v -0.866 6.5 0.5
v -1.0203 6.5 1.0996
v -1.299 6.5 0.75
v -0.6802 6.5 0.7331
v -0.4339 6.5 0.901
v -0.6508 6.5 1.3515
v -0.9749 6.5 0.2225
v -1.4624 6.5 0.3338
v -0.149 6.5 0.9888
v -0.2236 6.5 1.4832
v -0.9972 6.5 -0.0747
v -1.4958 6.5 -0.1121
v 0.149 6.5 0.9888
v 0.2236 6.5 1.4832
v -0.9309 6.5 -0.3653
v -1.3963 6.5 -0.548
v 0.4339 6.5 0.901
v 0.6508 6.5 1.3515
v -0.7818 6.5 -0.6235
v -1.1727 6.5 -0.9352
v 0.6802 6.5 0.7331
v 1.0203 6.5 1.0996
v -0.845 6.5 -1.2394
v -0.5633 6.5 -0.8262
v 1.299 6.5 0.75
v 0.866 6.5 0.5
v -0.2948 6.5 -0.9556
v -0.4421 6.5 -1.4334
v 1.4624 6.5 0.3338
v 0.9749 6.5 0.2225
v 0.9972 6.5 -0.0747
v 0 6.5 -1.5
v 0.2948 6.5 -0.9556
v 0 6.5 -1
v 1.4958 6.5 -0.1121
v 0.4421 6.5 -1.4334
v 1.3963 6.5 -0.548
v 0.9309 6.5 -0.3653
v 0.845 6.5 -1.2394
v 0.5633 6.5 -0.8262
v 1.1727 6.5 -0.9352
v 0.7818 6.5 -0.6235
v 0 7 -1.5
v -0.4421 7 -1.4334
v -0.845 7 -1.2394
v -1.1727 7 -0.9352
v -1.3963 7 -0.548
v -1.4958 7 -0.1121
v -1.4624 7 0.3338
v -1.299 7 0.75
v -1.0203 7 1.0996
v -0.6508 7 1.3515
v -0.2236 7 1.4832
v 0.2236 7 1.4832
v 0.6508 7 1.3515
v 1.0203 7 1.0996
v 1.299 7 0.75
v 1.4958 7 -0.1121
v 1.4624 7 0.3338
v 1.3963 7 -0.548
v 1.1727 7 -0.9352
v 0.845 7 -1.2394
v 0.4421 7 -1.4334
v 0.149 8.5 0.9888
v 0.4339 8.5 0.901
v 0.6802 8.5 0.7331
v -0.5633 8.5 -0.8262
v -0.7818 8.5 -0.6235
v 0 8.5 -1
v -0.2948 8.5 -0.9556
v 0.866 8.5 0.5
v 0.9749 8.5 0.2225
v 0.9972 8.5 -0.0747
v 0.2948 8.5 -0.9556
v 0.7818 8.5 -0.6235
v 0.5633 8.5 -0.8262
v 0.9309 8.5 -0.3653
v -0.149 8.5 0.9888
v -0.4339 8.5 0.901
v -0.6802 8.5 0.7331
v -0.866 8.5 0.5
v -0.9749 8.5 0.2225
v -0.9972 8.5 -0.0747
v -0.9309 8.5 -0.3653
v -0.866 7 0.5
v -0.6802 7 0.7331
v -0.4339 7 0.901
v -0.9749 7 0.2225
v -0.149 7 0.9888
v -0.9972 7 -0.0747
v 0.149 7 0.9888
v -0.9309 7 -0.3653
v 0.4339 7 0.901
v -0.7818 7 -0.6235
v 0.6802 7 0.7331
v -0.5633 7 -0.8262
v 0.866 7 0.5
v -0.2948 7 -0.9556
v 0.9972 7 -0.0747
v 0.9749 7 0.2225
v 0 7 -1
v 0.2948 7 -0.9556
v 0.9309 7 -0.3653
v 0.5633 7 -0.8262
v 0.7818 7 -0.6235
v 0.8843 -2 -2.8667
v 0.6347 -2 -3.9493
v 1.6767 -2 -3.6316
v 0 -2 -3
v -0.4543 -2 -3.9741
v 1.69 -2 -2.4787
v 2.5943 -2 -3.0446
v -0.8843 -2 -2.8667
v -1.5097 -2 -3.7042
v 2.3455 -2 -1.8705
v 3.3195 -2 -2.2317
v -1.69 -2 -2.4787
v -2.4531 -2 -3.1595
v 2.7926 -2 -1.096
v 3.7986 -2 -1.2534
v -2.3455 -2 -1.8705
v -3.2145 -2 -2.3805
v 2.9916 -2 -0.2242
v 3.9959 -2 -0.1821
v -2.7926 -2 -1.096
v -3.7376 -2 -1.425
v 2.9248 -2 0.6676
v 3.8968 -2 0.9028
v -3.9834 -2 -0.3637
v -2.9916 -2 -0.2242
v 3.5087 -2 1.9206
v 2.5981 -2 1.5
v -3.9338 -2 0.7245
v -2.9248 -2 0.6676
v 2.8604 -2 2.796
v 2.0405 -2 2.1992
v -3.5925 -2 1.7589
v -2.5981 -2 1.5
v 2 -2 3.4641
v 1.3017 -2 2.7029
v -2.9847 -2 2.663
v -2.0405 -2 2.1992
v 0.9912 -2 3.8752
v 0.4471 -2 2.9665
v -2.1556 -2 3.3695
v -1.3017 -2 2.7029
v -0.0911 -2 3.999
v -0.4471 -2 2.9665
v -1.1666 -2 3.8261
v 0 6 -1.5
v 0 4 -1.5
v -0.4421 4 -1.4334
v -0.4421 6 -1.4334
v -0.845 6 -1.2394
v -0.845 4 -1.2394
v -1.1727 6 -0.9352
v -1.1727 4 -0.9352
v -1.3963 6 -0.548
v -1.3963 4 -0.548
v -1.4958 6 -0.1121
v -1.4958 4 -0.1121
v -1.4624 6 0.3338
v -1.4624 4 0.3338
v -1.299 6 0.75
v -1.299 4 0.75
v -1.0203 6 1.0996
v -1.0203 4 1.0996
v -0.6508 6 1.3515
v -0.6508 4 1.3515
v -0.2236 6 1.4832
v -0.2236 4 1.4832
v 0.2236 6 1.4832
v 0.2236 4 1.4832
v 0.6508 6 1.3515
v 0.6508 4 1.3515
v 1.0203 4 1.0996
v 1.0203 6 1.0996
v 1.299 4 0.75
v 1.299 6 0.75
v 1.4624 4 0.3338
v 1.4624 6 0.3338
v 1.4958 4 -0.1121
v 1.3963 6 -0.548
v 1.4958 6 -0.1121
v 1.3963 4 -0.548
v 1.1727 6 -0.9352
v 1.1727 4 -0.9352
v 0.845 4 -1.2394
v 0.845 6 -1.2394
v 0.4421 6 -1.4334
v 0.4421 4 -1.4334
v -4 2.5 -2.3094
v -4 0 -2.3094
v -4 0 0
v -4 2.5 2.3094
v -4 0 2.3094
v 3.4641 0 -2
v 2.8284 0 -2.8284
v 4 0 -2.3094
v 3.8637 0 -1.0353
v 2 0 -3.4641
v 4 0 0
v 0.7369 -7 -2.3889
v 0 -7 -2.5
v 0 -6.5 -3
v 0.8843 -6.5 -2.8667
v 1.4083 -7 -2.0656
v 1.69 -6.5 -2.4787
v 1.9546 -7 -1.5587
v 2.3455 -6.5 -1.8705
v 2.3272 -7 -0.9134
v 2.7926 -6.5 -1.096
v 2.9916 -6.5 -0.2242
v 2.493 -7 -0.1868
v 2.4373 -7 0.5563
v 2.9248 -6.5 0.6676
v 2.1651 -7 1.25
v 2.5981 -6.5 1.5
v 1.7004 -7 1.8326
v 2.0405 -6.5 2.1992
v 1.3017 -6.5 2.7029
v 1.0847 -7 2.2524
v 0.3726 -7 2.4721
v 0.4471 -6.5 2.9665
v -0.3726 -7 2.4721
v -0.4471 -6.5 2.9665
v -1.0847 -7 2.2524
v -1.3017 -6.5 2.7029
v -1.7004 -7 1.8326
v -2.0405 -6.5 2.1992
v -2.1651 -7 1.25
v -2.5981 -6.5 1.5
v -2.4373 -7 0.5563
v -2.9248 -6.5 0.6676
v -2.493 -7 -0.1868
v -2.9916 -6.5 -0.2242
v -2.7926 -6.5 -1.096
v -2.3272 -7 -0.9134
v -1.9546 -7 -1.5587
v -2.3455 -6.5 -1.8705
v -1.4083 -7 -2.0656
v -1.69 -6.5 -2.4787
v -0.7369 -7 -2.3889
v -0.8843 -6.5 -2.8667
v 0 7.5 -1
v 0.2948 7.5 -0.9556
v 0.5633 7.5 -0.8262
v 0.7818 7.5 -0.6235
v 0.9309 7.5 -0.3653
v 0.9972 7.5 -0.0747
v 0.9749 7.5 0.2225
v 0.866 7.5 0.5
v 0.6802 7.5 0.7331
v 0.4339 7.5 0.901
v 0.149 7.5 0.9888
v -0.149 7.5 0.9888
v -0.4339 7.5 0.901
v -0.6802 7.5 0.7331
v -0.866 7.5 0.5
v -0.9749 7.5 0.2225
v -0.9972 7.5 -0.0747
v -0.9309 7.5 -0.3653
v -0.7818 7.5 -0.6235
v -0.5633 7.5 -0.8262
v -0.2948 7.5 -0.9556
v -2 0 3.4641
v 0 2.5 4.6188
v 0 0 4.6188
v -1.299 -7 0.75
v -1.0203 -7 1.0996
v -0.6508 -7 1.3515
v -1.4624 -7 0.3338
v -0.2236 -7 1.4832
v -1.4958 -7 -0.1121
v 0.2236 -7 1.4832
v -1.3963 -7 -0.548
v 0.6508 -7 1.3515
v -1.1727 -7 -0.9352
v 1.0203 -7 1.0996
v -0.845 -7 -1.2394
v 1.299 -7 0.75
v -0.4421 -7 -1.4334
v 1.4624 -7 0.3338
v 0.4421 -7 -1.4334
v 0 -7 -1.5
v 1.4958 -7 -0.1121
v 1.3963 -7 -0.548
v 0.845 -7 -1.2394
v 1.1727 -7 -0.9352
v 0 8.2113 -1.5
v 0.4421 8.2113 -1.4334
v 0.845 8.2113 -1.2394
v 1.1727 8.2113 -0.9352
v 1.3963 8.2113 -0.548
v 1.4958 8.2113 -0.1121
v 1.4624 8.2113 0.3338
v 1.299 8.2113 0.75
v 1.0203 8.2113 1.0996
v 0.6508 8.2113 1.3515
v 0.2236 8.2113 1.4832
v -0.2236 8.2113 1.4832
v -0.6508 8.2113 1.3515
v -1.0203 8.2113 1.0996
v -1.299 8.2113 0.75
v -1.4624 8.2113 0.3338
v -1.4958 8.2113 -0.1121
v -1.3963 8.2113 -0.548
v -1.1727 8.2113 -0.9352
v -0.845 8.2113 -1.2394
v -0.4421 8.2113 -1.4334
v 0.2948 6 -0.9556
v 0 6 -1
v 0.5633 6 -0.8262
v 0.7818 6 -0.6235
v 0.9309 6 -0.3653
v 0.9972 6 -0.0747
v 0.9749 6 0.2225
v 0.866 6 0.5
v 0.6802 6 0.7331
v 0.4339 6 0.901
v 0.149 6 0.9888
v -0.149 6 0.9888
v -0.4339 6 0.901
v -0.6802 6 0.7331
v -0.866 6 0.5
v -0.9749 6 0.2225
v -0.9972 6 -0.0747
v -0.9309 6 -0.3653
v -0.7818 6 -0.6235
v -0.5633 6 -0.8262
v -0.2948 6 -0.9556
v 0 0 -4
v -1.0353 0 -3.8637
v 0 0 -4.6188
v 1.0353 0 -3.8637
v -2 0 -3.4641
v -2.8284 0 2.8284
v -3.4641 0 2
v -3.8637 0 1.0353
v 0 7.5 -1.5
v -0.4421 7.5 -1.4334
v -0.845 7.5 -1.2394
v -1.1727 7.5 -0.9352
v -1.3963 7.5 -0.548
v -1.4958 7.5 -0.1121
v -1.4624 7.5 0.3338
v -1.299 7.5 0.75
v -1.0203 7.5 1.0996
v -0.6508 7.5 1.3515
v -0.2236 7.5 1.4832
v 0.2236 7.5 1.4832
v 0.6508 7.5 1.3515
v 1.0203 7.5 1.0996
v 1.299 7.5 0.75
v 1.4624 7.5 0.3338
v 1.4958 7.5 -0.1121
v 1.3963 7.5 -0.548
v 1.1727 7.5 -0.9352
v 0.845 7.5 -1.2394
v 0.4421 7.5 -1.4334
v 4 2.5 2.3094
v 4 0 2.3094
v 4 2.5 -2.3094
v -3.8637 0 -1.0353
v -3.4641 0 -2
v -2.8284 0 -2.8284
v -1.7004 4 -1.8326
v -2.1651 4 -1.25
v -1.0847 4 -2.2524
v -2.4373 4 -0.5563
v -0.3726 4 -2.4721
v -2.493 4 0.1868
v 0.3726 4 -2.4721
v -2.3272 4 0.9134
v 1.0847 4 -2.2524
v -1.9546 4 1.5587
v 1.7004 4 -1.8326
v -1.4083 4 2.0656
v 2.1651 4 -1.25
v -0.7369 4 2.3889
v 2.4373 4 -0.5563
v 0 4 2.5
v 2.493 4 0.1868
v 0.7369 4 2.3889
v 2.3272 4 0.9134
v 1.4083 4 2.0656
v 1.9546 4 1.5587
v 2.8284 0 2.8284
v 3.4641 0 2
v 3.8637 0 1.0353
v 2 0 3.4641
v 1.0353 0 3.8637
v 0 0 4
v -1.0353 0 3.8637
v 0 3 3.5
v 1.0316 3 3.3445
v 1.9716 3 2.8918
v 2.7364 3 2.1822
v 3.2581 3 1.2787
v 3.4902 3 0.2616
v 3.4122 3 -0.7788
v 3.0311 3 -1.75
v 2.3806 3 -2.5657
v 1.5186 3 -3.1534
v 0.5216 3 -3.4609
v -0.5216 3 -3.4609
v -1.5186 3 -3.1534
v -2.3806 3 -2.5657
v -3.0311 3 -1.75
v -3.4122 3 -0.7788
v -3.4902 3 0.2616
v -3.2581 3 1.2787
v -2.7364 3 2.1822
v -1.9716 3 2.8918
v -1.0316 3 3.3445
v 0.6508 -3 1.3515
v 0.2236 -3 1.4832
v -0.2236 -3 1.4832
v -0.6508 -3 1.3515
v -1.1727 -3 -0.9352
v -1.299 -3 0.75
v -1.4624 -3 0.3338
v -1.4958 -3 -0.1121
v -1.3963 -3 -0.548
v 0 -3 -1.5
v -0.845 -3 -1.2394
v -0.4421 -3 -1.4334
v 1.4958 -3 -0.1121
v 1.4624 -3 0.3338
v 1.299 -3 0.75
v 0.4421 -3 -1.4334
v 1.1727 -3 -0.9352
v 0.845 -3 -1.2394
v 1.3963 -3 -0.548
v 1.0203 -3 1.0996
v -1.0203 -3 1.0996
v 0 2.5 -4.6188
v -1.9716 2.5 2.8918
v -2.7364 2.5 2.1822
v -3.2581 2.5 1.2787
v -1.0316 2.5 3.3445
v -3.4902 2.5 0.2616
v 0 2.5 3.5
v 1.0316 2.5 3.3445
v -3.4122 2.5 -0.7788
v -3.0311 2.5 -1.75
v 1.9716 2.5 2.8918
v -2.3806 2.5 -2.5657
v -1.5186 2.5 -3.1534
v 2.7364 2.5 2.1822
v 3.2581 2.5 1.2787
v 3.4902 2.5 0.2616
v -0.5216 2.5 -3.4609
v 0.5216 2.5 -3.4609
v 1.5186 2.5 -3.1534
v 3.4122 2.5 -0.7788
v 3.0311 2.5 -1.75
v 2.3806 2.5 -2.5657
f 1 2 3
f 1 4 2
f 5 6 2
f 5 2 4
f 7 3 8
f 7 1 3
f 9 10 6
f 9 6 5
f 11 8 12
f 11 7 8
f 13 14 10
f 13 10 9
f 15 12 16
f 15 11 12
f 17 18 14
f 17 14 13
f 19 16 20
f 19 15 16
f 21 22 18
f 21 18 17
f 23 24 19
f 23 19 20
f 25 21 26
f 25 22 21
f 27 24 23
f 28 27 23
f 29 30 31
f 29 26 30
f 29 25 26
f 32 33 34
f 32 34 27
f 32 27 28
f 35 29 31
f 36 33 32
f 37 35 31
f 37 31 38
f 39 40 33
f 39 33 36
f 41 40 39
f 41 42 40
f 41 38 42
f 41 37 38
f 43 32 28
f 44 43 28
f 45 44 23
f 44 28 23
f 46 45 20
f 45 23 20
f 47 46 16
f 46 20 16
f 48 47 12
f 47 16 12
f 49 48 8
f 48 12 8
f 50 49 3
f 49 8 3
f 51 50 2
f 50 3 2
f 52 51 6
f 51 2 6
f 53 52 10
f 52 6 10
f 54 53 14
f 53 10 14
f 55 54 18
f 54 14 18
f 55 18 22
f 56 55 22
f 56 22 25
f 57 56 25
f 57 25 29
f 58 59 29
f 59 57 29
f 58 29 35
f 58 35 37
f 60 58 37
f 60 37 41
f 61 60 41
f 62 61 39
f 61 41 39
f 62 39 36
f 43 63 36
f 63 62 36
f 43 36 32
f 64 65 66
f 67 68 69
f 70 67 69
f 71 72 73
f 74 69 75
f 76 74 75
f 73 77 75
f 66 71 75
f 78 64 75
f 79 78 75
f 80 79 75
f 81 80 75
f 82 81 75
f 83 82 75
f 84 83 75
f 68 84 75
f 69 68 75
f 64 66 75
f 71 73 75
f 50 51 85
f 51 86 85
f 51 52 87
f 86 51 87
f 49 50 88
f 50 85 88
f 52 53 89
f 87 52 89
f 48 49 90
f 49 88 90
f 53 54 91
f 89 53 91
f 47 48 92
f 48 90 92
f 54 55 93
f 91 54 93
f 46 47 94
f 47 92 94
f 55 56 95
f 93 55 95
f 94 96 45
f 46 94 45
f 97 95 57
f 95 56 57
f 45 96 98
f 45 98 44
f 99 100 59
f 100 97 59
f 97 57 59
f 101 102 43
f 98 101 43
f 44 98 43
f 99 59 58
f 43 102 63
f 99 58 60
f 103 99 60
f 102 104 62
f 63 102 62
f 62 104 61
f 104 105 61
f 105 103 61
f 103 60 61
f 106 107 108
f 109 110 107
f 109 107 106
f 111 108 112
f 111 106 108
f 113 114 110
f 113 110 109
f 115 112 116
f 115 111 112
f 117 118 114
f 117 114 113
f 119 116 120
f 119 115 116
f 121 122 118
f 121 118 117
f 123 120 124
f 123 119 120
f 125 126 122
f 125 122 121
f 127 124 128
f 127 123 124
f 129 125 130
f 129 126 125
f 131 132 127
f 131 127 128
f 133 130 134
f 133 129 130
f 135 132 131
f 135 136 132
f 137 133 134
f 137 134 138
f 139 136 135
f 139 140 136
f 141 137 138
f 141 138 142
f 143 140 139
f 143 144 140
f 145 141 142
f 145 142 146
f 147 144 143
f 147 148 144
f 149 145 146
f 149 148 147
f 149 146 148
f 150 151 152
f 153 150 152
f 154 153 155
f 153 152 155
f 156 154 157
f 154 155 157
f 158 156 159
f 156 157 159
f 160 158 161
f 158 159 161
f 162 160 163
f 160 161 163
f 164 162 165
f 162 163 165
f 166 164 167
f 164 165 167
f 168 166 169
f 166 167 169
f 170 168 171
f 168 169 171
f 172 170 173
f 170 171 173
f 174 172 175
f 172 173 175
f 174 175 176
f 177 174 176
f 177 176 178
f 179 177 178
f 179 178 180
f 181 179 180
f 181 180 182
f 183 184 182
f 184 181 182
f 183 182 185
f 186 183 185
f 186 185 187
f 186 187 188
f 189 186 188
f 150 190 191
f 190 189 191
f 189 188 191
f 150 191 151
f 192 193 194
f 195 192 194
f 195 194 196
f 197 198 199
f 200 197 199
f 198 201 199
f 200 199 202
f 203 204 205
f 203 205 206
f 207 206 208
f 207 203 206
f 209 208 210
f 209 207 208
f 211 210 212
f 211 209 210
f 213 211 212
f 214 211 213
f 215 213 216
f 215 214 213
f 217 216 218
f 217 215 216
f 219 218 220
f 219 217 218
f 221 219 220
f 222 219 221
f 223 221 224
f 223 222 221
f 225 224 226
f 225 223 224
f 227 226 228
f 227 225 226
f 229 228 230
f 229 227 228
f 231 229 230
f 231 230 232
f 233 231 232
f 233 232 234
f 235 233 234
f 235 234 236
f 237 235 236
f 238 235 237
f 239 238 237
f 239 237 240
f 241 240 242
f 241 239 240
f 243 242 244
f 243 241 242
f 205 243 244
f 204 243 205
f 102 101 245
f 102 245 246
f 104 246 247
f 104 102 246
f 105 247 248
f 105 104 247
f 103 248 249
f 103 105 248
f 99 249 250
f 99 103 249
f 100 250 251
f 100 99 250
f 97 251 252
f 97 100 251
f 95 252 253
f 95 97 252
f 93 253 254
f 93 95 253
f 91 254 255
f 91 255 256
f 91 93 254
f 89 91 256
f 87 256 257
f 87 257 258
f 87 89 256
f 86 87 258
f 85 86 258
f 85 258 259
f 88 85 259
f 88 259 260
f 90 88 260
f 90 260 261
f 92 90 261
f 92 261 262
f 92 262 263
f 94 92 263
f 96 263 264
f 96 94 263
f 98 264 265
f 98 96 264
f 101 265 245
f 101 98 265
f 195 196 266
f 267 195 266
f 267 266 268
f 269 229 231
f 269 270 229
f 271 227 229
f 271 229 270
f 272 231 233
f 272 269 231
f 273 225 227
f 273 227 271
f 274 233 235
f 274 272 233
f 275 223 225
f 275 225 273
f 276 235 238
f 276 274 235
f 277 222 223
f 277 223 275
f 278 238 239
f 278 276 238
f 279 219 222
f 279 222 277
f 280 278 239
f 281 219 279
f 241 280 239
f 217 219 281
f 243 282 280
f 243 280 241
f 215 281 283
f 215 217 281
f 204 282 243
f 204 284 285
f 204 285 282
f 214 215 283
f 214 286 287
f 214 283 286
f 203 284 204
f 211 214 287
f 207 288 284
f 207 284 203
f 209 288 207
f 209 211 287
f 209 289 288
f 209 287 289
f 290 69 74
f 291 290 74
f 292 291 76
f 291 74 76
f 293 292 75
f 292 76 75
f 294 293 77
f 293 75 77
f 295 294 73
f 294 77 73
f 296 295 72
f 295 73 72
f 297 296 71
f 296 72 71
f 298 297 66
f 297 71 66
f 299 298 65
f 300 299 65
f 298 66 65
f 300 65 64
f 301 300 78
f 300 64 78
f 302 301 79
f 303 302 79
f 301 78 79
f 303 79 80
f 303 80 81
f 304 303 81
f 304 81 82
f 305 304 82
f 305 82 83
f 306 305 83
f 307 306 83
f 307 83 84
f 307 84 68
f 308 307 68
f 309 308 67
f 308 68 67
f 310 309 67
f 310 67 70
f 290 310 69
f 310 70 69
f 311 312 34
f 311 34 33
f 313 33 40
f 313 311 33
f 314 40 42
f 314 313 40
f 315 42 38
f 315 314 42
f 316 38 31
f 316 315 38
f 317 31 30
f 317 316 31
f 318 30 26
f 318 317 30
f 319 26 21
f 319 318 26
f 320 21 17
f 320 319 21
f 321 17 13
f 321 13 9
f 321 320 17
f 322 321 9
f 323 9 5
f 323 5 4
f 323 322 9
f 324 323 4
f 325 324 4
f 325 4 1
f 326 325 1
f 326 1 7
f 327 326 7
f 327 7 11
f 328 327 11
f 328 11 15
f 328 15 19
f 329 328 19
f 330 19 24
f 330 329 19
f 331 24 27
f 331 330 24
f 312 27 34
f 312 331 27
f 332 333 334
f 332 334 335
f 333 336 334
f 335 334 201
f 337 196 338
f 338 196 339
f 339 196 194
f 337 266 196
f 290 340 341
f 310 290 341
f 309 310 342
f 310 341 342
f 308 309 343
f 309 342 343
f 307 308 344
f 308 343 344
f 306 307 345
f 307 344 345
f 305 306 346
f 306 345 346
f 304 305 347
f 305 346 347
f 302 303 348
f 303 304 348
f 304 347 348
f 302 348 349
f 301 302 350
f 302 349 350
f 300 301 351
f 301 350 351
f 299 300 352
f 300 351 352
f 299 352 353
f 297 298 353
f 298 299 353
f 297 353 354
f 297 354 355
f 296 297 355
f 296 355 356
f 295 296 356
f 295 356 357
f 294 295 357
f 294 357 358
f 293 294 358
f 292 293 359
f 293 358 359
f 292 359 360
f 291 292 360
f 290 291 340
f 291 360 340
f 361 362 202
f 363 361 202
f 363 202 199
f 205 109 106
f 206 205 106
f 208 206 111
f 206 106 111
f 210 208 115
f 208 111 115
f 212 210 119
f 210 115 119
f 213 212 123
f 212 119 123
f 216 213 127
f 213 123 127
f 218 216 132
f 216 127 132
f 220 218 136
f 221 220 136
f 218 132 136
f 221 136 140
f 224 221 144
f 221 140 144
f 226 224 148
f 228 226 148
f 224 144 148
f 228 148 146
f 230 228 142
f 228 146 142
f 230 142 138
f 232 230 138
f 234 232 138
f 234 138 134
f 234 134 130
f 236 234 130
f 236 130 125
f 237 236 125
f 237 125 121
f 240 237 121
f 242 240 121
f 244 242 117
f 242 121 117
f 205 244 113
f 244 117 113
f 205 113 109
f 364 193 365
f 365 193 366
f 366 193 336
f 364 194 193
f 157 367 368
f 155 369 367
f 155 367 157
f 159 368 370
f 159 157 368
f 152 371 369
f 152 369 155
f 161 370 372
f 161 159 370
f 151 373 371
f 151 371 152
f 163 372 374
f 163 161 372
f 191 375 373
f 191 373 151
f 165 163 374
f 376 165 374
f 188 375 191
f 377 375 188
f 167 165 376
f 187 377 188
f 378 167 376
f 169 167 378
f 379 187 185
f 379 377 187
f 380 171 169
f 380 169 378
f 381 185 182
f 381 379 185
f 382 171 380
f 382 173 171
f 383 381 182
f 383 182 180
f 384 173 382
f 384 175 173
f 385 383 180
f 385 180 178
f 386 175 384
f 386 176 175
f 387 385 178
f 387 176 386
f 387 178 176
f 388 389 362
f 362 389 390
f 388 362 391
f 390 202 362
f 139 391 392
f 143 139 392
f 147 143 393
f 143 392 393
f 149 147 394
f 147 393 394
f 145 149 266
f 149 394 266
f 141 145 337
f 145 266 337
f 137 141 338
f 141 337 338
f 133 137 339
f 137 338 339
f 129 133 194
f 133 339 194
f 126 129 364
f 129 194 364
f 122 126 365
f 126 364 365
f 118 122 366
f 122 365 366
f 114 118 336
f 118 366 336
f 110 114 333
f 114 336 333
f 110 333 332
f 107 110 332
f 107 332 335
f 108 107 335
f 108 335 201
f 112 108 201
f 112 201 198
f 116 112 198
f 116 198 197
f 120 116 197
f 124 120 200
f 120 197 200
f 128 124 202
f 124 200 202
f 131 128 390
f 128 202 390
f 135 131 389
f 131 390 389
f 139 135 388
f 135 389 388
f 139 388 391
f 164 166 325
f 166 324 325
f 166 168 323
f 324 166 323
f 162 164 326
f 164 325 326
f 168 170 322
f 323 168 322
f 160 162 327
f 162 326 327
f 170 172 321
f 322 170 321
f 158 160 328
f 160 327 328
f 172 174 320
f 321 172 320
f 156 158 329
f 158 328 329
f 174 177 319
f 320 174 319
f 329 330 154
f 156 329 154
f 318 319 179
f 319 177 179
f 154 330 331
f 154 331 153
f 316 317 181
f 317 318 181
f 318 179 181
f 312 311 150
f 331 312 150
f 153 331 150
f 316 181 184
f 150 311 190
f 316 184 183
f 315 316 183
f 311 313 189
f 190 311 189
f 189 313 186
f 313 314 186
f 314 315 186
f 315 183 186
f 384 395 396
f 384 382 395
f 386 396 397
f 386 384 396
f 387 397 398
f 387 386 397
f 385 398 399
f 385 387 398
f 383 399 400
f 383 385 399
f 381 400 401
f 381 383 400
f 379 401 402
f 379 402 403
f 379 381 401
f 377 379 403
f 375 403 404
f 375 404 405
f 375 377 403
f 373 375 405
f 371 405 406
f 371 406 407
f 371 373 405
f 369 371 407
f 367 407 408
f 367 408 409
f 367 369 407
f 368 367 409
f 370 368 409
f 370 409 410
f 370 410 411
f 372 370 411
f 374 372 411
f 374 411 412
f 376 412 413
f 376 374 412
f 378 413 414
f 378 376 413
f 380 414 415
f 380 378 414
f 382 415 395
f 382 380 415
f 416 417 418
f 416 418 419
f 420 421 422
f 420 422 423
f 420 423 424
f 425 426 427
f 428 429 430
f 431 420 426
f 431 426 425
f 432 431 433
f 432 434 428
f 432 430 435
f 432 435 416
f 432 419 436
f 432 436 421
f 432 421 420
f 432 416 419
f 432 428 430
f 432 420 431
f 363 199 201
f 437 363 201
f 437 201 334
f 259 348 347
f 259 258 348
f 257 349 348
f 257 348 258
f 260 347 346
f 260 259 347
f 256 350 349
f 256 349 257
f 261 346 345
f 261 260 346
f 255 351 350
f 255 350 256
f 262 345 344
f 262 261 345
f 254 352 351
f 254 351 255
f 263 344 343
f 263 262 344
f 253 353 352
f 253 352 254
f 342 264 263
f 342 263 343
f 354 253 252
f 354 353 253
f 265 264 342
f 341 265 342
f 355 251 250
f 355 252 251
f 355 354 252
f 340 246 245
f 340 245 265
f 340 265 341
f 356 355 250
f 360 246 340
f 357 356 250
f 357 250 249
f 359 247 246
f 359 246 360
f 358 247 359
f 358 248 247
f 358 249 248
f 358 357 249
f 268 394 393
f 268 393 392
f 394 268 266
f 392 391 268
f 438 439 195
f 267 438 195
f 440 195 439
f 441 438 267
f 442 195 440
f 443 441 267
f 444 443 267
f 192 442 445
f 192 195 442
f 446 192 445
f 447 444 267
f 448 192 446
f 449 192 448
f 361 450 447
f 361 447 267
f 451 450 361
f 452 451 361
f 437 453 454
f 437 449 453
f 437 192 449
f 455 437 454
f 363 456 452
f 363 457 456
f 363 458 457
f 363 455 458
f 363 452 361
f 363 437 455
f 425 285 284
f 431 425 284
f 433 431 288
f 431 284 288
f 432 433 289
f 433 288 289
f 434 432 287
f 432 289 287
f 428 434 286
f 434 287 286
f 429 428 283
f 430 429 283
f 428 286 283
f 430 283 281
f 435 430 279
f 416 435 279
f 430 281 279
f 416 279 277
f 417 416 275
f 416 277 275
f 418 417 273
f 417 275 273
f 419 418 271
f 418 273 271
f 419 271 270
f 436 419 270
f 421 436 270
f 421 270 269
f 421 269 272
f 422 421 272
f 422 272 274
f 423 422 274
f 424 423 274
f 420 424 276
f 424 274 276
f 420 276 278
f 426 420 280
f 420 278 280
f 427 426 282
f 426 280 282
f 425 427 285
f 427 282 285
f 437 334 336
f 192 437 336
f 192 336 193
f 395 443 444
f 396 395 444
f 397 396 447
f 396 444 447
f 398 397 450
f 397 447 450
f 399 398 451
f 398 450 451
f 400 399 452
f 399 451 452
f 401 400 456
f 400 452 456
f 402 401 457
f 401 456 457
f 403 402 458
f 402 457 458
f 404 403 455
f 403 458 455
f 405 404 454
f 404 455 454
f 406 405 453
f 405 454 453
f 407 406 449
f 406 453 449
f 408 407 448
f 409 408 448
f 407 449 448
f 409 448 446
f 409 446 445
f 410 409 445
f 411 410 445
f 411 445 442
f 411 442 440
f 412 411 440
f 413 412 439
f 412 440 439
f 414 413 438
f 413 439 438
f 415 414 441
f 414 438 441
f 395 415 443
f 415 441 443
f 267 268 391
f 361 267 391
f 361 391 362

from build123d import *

# Parameters (mm, degrees)
BOSS_EXTRUDE5_DEPTH  = 2.5
SKETCH6_R            = 4
BOSS_EXTRUDE6_DEPTH  = 2
SKETCH7_R            = 3
BOSS_EXTRUDE7_DEPTH  = 5
SKETCH8_R            = 1.5
CUT_EXTRUDE1_DEPTH   = 4
SKETCH9_R            = 1.5
BOSS_EXTRUDE8_DEPTH  = 3.5
SKETCH10_R           = 3.5
BOSS_EXTRUDE9_DEPTH  = 0.5
SKETCH11_R           = 3.5
BOSS_EXTRUDE10_DEPTH = 1
BOSS_EXTRUDE10_TAPER = 45
BOSS_EXTRUDE11_START = -4
SKETCH12_R           = 1.5
BOSS_EXTRUDE11_DEPTH = 11.5
CUT_EXTRUDE2_START   = -13
SKETCH13_R           = 1.5
SKETCH13_R_2         = 1
CUT_EXTRUDE2_DEPTH   = 0.5
CUT_EXTRUDE3_START   = -0.5
SKETCH14_R           = 1.5
SKETCH14_R_2         = 1
CUT_EXTRUDE3_DEPTH   = 0.5
CHAMFER1_SIZE        = 0.288675135
CHAMFER1_SIZE2       = 0.5
CHAMFER2_SIZE        = 0.5


with BuildPart() as part:
    # Sketch5 → Boss-Extrude5 (new body)
    with BuildSketch(Plane(origin=(0, 0, 0), x_dir=(1, 0, 0), z_dir=(0, 1, 0))):
        Polygon((-4, 2.309401077), (-4, -2.309401077), (0, -4.618802154), (4, -2.309401077), (4, 2.309401077), (0, 4.618802154), align=None)
    extrude(amount=BOSS_EXTRUDE5_DEPTH)

    # Sketch6 → Boss-Extrude6 (add)
    with BuildSketch(Plane.XZ):
        with Locations(Location((0, 0, 0), (0, 0, 60))):
            Circle(SKETCH6_R)
    extrude(amount=BOSS_EXTRUDE6_DEPTH)

    # Sketch7 → Boss-Extrude7 (add)
    with BuildSketch(Plane.XZ.offset(2)):
        with Locations(Location((0, 0, 0), (0, 0, 270))):
            Circle(SKETCH7_R)
    extrude(amount=BOSS_EXTRUDE7_DEPTH)

    # Sketch8 → Cut-Extrude1 (cut)
    with BuildSketch(Plane.XZ.offset(7)):
        with Locations(Location((0, 0, 0), (0, 0, 270))):
            Circle(SKETCH8_R)
    extrude(amount=-CUT_EXTRUDE1_DEPTH, mode=Mode.SUBTRACT)

    # Sketch9 → Boss-Extrude8 (add)
    with BuildSketch(Plane(origin=(0, 2.5, 0), x_dir=(1, 0, 0), z_dir=(0, 1, 0))):
        with Locations(Location((0, 0, 0), (0, 0, 90))):
            Circle(SKETCH9_R)
    extrude(amount=BOSS_EXTRUDE8_DEPTH)

    # Sketch10 → Boss-Extrude9 (add)
    with BuildSketch(Plane(origin=(0, 2.5, 0), x_dir=(1, 0, 0), z_dir=(0, 1, 0))):
        with Locations(Location((0, 0, 0), (0, 0, 270))):
            Circle(SKETCH10_R)
    extrude(amount=BOSS_EXTRUDE9_DEPTH)

    # Sketch11 → Boss-Extrude10 (add)
    with BuildSketch(Plane(origin=(0, 3, 0), x_dir=(1, 0, 0), z_dir=(0, 1, 0))):
        with Locations(Location((0, 0, 0), (0, 0, 270))):
            Circle(SKETCH11_R)
    extrude(amount=BOSS_EXTRUDE10_DEPTH, taper=BOSS_EXTRUDE10_TAPER)

    # Sketch12 → Boss-Extrude11 (add)
    with BuildSketch(Plane.XZ.offset(7).offset(BOSS_EXTRUDE11_START)):
        with Locations(Location((0, 0, 0), (0, 0, 270))):
            Circle(SKETCH12_R)
    extrude(amount=-BOSS_EXTRUDE11_DEPTH)

    # Sketch13 → Cut-Extrude2 (cut)
    with BuildSketch(Plane.XZ.offset(7).offset(CUT_EXTRUDE2_START)):
        with Locations(Location((0, 0, 0), (0, 0, 270))):
            Circle(SKETCH13_R)
        with Locations(Location((0, 0, 0), (0, 0, 270))):
            Circle(SKETCH13_R_2, mode=Mode.SUBTRACT)
    extrude(amount=-CUT_EXTRUDE2_DEPTH, mode=Mode.SUBTRACT)

    # Sketch14 → Cut-Extrude3 (cut)
    with BuildSketch(Plane.XZ.offset(-6.5).offset(CUT_EXTRUDE3_START)):
        with Locations(Location((0, 0, 0), (0, 0, 270))):
            Circle(SKETCH14_R)
        with Locations(Location((0, 0, 0), (0, 0, 270))):
            Circle(SKETCH14_R_2, mode=Mode.SUBTRACT)
    extrude(amount=-CUT_EXTRUDE3_DEPTH, mode=Mode.SUBTRACT)

    # Chamfer1
    chamfer1_edges = [part.edges().sort_by_distance(p)[0] for p in [
        (0, 8.5, 1.5),
    ]]
    chamfer1_side = [part.faces().sort_by_distance(p)[0] for p in [
        (0, 8, 1.5),
    ]]
    chamfer(chamfer1_edges, length=CHAMFER1_SIZE, length2=CHAMFER1_SIZE2, reference=chamfer1_side[0])

    # Chamfer2
    chamfer2_edges = [part.edges().sort_by_distance(p)[0] for p in [
        (0, -7, 3),
    ]]
    chamfer(chamfer2_edges, length=CHAMFER2_SIZE)


solid = part.part
